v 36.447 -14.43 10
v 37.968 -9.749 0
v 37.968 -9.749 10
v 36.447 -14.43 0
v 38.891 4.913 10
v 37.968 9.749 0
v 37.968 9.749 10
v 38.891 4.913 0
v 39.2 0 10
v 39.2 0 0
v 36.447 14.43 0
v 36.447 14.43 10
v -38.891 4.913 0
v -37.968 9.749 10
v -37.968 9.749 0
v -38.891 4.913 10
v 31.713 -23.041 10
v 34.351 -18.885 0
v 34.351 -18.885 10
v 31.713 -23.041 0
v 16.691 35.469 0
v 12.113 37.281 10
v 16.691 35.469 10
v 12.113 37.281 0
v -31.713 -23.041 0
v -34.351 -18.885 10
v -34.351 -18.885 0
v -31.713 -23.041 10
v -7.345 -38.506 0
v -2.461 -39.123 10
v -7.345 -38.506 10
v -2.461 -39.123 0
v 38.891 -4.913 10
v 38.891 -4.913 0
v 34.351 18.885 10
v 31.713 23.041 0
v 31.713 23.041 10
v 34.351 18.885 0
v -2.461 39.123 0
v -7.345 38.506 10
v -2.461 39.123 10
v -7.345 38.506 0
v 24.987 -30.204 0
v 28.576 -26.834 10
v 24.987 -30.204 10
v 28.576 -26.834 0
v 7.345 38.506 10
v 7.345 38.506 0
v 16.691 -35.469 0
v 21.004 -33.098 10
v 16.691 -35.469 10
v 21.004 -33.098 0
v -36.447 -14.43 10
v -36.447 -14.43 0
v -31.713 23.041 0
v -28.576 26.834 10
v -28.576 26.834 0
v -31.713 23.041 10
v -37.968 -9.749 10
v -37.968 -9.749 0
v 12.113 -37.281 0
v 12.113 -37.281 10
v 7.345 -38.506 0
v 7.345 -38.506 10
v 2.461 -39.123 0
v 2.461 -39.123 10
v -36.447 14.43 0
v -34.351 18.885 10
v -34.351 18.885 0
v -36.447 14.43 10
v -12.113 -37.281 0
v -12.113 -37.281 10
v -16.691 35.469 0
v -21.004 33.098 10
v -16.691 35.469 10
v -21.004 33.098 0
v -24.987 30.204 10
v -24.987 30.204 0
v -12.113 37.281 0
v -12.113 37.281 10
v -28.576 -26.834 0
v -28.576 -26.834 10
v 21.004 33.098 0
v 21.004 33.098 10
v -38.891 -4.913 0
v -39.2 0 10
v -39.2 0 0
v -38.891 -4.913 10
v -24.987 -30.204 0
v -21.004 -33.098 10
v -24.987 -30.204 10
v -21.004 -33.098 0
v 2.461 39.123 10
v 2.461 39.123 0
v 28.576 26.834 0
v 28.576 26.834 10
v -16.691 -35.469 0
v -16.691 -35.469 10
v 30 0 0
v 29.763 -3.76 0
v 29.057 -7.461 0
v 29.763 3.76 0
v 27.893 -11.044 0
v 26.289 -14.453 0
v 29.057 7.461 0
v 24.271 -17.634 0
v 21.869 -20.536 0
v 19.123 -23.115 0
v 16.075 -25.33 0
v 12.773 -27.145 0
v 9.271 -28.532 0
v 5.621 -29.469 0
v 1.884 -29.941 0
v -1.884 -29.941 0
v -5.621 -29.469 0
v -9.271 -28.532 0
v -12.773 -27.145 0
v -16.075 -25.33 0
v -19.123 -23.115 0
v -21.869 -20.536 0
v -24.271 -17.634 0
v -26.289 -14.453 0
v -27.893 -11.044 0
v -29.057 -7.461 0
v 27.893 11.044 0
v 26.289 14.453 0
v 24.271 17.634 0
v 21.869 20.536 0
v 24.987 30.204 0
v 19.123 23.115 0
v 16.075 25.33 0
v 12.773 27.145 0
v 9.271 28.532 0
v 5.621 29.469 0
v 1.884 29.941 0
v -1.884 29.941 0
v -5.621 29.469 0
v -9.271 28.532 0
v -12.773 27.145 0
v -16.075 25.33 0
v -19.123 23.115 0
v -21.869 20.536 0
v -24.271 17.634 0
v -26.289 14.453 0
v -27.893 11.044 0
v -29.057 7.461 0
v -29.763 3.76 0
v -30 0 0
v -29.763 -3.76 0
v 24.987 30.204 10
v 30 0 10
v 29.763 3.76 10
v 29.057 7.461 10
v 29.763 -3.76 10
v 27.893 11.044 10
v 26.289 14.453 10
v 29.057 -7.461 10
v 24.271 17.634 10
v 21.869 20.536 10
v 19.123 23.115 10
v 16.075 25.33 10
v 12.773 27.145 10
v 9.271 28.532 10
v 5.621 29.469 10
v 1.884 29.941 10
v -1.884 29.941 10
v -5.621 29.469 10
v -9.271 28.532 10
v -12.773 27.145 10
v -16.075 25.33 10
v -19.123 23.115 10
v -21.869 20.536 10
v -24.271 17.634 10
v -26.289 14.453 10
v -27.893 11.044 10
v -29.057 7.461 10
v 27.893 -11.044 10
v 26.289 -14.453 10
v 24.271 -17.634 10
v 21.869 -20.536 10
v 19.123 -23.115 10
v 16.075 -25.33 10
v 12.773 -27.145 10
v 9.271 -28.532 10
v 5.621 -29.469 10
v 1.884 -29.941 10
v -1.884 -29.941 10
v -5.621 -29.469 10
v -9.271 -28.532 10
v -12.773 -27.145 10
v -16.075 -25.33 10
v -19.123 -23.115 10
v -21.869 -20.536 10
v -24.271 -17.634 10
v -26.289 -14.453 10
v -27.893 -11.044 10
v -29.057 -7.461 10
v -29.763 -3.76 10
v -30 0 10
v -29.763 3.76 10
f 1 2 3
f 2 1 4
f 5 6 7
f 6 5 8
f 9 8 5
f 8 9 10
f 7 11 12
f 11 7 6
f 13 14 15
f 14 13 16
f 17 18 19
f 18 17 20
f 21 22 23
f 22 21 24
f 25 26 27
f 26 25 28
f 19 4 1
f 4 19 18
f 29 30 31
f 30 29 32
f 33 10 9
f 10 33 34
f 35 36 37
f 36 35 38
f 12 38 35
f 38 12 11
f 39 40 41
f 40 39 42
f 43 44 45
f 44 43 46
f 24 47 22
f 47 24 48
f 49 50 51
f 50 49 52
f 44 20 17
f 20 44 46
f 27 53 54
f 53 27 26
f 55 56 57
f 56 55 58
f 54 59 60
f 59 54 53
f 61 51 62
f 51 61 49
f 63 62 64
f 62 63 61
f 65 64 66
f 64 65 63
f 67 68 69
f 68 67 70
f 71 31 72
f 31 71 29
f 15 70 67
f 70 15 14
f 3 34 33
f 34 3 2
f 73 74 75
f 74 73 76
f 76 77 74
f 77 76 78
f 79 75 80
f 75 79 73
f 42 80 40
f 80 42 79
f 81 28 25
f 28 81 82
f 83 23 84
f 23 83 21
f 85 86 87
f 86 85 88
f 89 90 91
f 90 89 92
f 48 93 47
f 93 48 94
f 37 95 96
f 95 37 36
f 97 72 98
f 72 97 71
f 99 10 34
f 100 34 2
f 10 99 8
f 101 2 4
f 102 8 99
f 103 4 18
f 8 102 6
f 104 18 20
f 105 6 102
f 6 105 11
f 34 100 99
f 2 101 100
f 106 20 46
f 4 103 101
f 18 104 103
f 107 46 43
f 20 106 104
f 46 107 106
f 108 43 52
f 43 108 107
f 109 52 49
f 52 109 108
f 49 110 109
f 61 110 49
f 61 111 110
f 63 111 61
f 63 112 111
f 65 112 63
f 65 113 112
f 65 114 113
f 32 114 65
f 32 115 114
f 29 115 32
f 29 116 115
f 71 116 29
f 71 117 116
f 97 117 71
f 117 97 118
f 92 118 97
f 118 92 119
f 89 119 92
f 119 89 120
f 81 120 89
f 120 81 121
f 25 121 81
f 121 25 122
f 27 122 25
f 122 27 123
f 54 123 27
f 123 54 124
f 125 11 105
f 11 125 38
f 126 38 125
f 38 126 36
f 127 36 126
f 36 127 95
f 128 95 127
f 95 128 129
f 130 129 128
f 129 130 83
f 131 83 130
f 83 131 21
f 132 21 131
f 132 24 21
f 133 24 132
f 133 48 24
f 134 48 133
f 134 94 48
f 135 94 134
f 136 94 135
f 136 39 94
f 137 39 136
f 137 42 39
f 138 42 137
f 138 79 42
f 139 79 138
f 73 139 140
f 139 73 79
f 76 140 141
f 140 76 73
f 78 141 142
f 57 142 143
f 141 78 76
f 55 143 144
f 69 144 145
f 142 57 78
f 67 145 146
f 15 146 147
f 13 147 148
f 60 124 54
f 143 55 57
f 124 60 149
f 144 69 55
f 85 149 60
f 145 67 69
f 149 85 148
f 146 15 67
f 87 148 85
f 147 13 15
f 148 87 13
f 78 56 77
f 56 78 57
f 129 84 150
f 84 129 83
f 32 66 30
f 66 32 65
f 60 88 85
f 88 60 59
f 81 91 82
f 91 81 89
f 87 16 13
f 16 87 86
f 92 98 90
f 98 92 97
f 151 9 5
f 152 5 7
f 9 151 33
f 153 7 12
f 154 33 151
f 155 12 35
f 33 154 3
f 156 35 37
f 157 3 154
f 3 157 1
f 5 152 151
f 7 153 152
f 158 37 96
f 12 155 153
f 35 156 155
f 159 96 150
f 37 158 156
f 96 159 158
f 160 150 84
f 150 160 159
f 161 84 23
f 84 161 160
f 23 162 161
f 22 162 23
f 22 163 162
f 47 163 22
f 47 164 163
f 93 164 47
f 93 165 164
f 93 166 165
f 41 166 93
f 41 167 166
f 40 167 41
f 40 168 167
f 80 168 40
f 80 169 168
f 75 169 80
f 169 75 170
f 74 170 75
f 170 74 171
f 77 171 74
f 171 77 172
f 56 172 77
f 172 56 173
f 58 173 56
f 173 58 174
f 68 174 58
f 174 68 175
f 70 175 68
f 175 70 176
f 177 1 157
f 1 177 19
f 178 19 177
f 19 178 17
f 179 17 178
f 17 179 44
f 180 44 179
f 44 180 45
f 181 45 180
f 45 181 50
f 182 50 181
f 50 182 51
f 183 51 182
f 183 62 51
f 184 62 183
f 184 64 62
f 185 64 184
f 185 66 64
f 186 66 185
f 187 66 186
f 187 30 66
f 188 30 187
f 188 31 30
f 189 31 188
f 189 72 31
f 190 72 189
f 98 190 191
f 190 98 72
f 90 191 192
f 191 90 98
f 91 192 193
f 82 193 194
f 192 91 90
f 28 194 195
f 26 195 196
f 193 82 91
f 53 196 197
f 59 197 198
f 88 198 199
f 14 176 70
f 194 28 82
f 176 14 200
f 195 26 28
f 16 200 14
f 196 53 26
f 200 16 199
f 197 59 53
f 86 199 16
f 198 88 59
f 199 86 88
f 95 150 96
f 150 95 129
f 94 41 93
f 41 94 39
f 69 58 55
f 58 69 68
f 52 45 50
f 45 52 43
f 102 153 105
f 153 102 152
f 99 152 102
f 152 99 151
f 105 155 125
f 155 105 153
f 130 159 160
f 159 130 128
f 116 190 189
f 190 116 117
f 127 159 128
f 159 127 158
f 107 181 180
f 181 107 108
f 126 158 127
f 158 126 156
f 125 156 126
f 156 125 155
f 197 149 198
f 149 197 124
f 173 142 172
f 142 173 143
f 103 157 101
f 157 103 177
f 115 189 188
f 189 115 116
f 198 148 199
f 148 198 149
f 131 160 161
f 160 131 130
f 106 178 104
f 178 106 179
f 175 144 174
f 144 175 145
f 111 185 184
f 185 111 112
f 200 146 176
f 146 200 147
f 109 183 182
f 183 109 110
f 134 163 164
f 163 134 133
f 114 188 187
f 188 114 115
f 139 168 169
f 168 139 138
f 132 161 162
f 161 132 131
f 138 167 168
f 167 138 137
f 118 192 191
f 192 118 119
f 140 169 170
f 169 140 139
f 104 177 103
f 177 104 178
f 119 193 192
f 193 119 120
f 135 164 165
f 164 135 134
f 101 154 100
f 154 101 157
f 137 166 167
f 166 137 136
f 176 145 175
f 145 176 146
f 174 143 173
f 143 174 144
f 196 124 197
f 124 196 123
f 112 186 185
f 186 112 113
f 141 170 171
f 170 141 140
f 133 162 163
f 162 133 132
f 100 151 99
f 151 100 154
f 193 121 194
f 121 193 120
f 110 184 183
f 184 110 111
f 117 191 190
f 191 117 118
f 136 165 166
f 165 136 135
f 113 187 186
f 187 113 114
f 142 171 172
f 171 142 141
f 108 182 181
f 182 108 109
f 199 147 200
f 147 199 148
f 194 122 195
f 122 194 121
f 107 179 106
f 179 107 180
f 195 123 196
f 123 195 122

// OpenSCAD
$fn = 50;


difference() {
	union() {
		cylinder(h = 10, r = 39.2000000000);
	}
	union() {
		cylinder(h = 10, r = 30.0000000000);
	}
}
